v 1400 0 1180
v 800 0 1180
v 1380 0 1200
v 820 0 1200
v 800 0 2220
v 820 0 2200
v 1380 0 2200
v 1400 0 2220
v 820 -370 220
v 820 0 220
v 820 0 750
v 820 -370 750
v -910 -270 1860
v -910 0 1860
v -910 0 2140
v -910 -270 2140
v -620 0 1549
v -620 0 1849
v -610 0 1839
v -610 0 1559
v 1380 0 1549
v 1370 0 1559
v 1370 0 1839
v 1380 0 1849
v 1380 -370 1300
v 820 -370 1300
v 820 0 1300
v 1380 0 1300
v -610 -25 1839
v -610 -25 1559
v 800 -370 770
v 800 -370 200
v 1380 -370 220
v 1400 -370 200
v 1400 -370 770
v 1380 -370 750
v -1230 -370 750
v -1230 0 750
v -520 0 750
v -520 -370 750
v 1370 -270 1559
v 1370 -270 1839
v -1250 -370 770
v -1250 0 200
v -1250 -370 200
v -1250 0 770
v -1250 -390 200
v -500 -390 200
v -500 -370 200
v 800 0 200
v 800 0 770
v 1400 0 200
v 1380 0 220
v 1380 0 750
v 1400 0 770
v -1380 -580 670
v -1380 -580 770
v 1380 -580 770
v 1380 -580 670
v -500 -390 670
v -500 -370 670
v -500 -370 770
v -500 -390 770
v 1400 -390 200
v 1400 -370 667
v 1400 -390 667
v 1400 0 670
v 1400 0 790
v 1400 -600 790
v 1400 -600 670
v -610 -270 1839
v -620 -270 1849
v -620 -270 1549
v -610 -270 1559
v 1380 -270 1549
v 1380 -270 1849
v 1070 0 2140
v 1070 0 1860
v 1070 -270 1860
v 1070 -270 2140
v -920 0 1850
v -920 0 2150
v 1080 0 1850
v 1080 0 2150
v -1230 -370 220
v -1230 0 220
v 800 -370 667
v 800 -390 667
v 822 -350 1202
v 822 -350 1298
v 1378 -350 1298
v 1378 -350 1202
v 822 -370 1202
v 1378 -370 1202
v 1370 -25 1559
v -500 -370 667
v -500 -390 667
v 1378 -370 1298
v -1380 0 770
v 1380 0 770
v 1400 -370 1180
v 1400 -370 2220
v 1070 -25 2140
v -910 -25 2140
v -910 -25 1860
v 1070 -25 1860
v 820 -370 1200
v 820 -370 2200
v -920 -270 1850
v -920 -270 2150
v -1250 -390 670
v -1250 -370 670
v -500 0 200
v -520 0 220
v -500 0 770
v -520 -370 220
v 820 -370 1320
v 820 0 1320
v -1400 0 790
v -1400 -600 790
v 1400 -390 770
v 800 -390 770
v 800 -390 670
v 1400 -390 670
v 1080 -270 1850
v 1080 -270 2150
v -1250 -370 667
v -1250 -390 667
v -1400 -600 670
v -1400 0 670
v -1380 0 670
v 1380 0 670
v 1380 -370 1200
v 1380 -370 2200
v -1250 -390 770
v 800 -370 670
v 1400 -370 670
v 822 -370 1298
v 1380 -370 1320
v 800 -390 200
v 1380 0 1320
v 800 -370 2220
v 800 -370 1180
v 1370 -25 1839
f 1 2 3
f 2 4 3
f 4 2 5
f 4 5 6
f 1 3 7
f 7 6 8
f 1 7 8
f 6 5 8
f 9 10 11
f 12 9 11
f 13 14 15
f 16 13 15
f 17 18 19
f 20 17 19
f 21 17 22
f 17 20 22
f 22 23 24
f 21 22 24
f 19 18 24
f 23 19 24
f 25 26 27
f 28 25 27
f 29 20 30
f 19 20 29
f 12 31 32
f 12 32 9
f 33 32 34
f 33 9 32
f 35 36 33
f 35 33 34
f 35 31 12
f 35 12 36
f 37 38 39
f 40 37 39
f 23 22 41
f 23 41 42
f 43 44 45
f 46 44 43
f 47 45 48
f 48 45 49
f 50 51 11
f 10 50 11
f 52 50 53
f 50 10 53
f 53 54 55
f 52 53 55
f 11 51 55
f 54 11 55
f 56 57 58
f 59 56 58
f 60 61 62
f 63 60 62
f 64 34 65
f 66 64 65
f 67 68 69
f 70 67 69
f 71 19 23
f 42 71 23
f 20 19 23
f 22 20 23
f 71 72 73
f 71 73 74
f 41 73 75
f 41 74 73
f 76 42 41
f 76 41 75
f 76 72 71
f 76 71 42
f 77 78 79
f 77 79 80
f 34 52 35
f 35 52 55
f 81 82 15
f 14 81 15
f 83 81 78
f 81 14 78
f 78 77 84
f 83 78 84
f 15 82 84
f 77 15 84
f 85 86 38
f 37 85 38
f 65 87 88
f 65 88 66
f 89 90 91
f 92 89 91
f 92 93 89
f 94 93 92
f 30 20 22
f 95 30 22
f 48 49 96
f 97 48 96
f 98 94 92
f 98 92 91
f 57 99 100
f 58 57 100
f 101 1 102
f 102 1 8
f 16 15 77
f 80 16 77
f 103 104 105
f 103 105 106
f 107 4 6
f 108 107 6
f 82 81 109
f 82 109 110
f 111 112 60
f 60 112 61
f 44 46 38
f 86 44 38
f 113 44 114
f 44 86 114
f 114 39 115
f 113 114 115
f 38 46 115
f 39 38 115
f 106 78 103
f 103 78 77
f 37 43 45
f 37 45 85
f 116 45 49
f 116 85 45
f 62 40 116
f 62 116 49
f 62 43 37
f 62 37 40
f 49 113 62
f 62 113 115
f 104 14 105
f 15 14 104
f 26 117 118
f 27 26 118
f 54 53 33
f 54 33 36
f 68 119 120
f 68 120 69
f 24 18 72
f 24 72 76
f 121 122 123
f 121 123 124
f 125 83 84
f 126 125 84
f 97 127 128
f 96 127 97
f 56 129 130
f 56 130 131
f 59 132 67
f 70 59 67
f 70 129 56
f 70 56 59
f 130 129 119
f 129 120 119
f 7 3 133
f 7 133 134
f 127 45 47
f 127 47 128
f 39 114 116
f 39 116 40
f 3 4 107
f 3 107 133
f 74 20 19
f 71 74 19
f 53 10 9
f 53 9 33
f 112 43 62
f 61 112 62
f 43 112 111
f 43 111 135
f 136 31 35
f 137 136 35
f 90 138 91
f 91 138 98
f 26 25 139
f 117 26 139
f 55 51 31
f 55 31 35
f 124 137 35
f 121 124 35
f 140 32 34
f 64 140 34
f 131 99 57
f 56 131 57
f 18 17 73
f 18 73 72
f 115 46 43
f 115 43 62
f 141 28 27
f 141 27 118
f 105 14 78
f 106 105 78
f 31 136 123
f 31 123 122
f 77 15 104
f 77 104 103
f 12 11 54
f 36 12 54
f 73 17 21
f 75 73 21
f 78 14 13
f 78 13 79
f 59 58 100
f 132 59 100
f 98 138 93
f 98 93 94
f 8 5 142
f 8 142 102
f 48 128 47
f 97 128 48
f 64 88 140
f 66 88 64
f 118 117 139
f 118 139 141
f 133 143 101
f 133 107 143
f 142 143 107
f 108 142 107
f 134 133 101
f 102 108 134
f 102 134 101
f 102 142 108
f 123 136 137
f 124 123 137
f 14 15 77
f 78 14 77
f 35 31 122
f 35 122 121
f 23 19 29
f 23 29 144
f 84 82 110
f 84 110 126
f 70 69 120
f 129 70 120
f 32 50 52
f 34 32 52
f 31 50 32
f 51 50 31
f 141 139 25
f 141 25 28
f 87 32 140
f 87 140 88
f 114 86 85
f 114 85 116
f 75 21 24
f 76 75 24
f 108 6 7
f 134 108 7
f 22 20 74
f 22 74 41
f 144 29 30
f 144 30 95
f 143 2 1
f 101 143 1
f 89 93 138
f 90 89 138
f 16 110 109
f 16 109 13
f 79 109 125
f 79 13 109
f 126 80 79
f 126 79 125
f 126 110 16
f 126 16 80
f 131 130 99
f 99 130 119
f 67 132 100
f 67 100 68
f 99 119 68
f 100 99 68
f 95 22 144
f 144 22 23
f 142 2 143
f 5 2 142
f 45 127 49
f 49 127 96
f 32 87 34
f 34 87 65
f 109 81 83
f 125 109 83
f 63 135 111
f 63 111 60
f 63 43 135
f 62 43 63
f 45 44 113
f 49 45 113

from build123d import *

# Parameters (mm, degrees)
F2_W      = 2800
F2_H      = 600
F3_DEPTH  = 20
F5_DEPTH  = 100
F6_W      = 750
F6_H      = 570
F6_W_2    = 710
F6_H_2    = 530
F7_DEPTH  = 370
F6_W_3    = 600
F6_W_4    = 560
F8_W      = 750
F8_H      = 100
F9_DEPTH  = 20
F8_W_2    = 600
F8_H_2    = 467
F10_W     = 2000
F10_H     = 300
F10_W_2   = 1980
F10_H_2   = 280
F11_DEPTH = 270
F12_W     = 1980
F12_H     = 280
F13_DEPTH = 25
F14_W     = 600
F14_H     = 1040
F14_W_2   = 560
F14_H_2   = 1000
F15_DEPTH = 370
F16_W     = 370
F16_H     = 20
F17_DEPTH = 560
F18_W     = 556
F18_H     = 96
F19_DEPTH = 20


with BuildPart() as f3:
    # F2 (on plane+point) → F3 (new body)
    with BuildSketch(Plane.XY.offset(770)):
        with Locations((0, -300)):
            Rectangle(F2_W, F2_H)
    extrude(amount=F3_DEPTH)

    # F4 (on face) → F5 (join)
    with BuildSketch(Plane(origin=(0, 0, 770), x_dir=(1, 0, 0), z_dir=(0, 0, -1))):
        Polygon((1400, 600), (-1400, 600), (-1400, 0), (-1380, 0), (-1380, 580), (1380, 580), (1380, 0), (1400, 0), align=None)
    extrude(amount=F5_DEPTH)


with BuildPart() as f7:
    # F6 (on Front) → F7 (new body)
    with BuildSketch(Plane.XZ):
        with Locations((-875, 485)):
            Rectangle(F6_W, F6_H)
        with Locations((-875, 485)):
            Rectangle(F6_W_2, F6_H_2, mode=Mode.SUBTRACT)
    extrude(amount=F7_DEPTH)


with BuildPart() as f7b:
    # F6 (on Front) → F7, piece 2 (new body)
    with BuildSketch(Plane.XZ):
        with Locations((1100, 485)):
            Rectangle(F6_W_3, F6_H)
        with Locations((1100, 485)):
            Rectangle(F6_W_4, F6_H_2, mode=Mode.SUBTRACT)
    extrude(amount=F7_DEPTH)


with BuildPart() as f9:
    # F8 (on face) → F9 (new body)
    with BuildSketch(Plane.XZ.offset(370)):
        with Locations((-875, 720)):
            Rectangle(F8_W, F8_H)
    extrude(amount=F9_DEPTH)


with BuildPart() as f9b:
    # F8 (on face) → F9, piece 2 (new body)
    with BuildSketch(Plane.XZ.offset(370)):
        with Locations((1100, 720)):
            Rectangle(F8_W_2, F8_H)
    extrude(amount=F9_DEPTH)


with BuildPart() as f9c:
    # F8 (on face) → F9, piece 3 (new body)
    with BuildSketch(Plane.XZ.offset(370)):
        with Locations((-875, 433.5)):
            Rectangle(F8_W, F8_H_2)
    extrude(amount=F9_DEPTH)


with BuildPart() as f9d:
    # F8 (on face) → F9, piece 4 (new body)
    with BuildSketch(Plane.XZ.offset(370)):
        with Locations((1100, 433.5)):
            Rectangle(F8_W_2, F8_H_2)
    extrude(amount=F9_DEPTH)


with BuildPart() as f11:
    # F10 (on face) → F11 (new body)
    with BuildSketch(Plane.XZ):
        with Locations((80, 2000)):
            Rectangle(F10_W, F10_H)
        with Locations((80, 2000)):
            Rectangle(F10_W_2, F10_H_2, mode=Mode.SUBTRACT)
    extrude(amount=F11_DEPTH)


with BuildPart() as f11b:
    # F10 (on face) → F11, piece 2 (new body)
    with BuildSketch(Plane.XZ):
        with Locations((380, 1699)):
            Rectangle(F10_W, F10_H)
        with Locations((380, 1699)):
            Rectangle(F10_W_2, F10_H_2, mode=Mode.SUBTRACT)
    extrude(amount=F11_DEPTH)


with BuildPart() as f13:
    # F12 (on Front) → F13 (new body)
    with BuildSketch(Plane.XZ):
        with Locations((80, 2000)):
            Rectangle(F12_W, F12_H)
    extrude(amount=F13_DEPTH)


with BuildPart() as f13b:
    # F12 (on Front) → F13, piece 2 (new body)
    with BuildSketch(Plane.XZ):
        with Locations((380, 1699)):
            Rectangle(F12_W, F12_H)
    extrude(amount=F13_DEPTH)


with BuildPart() as f15:
    # F14 (on Front) → F15 (new body)
    with BuildSketch(Plane.XZ):
        with Locations((1100, 1700)):
            Rectangle(F14_W, F14_H)
        with Locations((1100, 1700)):
            Rectangle(F14_W_2, F14_H_2, mode=Mode.SUBTRACT)
    extrude(amount=F15_DEPTH)


with BuildPart() as f17:
    # F16 (on face) → F17 (new body, through all)
    with BuildSketch(Plane.YZ.offset(820)):
        with Locations((-185, 1310)):
            Rectangle(F16_W, F16_H)
    extrude(amount=F17_DEPTH)


with BuildPart() as f19:
    # F18 (on face) → F19 (new body)
    with BuildSketch(Plane.XZ.offset(370)):
        with Locations((1100, 1250)):
            Rectangle(F18_W, F18_H)
    extrude(amount=-F19_DEPTH)


solid = Compound([f3.part, f7.part, f7b.part, f9.part, f9b.part, f9c.part, f9d.part, f11.part, f11b.part, f13.part, f13b.part, f15.part, f17.part, f19.part])
